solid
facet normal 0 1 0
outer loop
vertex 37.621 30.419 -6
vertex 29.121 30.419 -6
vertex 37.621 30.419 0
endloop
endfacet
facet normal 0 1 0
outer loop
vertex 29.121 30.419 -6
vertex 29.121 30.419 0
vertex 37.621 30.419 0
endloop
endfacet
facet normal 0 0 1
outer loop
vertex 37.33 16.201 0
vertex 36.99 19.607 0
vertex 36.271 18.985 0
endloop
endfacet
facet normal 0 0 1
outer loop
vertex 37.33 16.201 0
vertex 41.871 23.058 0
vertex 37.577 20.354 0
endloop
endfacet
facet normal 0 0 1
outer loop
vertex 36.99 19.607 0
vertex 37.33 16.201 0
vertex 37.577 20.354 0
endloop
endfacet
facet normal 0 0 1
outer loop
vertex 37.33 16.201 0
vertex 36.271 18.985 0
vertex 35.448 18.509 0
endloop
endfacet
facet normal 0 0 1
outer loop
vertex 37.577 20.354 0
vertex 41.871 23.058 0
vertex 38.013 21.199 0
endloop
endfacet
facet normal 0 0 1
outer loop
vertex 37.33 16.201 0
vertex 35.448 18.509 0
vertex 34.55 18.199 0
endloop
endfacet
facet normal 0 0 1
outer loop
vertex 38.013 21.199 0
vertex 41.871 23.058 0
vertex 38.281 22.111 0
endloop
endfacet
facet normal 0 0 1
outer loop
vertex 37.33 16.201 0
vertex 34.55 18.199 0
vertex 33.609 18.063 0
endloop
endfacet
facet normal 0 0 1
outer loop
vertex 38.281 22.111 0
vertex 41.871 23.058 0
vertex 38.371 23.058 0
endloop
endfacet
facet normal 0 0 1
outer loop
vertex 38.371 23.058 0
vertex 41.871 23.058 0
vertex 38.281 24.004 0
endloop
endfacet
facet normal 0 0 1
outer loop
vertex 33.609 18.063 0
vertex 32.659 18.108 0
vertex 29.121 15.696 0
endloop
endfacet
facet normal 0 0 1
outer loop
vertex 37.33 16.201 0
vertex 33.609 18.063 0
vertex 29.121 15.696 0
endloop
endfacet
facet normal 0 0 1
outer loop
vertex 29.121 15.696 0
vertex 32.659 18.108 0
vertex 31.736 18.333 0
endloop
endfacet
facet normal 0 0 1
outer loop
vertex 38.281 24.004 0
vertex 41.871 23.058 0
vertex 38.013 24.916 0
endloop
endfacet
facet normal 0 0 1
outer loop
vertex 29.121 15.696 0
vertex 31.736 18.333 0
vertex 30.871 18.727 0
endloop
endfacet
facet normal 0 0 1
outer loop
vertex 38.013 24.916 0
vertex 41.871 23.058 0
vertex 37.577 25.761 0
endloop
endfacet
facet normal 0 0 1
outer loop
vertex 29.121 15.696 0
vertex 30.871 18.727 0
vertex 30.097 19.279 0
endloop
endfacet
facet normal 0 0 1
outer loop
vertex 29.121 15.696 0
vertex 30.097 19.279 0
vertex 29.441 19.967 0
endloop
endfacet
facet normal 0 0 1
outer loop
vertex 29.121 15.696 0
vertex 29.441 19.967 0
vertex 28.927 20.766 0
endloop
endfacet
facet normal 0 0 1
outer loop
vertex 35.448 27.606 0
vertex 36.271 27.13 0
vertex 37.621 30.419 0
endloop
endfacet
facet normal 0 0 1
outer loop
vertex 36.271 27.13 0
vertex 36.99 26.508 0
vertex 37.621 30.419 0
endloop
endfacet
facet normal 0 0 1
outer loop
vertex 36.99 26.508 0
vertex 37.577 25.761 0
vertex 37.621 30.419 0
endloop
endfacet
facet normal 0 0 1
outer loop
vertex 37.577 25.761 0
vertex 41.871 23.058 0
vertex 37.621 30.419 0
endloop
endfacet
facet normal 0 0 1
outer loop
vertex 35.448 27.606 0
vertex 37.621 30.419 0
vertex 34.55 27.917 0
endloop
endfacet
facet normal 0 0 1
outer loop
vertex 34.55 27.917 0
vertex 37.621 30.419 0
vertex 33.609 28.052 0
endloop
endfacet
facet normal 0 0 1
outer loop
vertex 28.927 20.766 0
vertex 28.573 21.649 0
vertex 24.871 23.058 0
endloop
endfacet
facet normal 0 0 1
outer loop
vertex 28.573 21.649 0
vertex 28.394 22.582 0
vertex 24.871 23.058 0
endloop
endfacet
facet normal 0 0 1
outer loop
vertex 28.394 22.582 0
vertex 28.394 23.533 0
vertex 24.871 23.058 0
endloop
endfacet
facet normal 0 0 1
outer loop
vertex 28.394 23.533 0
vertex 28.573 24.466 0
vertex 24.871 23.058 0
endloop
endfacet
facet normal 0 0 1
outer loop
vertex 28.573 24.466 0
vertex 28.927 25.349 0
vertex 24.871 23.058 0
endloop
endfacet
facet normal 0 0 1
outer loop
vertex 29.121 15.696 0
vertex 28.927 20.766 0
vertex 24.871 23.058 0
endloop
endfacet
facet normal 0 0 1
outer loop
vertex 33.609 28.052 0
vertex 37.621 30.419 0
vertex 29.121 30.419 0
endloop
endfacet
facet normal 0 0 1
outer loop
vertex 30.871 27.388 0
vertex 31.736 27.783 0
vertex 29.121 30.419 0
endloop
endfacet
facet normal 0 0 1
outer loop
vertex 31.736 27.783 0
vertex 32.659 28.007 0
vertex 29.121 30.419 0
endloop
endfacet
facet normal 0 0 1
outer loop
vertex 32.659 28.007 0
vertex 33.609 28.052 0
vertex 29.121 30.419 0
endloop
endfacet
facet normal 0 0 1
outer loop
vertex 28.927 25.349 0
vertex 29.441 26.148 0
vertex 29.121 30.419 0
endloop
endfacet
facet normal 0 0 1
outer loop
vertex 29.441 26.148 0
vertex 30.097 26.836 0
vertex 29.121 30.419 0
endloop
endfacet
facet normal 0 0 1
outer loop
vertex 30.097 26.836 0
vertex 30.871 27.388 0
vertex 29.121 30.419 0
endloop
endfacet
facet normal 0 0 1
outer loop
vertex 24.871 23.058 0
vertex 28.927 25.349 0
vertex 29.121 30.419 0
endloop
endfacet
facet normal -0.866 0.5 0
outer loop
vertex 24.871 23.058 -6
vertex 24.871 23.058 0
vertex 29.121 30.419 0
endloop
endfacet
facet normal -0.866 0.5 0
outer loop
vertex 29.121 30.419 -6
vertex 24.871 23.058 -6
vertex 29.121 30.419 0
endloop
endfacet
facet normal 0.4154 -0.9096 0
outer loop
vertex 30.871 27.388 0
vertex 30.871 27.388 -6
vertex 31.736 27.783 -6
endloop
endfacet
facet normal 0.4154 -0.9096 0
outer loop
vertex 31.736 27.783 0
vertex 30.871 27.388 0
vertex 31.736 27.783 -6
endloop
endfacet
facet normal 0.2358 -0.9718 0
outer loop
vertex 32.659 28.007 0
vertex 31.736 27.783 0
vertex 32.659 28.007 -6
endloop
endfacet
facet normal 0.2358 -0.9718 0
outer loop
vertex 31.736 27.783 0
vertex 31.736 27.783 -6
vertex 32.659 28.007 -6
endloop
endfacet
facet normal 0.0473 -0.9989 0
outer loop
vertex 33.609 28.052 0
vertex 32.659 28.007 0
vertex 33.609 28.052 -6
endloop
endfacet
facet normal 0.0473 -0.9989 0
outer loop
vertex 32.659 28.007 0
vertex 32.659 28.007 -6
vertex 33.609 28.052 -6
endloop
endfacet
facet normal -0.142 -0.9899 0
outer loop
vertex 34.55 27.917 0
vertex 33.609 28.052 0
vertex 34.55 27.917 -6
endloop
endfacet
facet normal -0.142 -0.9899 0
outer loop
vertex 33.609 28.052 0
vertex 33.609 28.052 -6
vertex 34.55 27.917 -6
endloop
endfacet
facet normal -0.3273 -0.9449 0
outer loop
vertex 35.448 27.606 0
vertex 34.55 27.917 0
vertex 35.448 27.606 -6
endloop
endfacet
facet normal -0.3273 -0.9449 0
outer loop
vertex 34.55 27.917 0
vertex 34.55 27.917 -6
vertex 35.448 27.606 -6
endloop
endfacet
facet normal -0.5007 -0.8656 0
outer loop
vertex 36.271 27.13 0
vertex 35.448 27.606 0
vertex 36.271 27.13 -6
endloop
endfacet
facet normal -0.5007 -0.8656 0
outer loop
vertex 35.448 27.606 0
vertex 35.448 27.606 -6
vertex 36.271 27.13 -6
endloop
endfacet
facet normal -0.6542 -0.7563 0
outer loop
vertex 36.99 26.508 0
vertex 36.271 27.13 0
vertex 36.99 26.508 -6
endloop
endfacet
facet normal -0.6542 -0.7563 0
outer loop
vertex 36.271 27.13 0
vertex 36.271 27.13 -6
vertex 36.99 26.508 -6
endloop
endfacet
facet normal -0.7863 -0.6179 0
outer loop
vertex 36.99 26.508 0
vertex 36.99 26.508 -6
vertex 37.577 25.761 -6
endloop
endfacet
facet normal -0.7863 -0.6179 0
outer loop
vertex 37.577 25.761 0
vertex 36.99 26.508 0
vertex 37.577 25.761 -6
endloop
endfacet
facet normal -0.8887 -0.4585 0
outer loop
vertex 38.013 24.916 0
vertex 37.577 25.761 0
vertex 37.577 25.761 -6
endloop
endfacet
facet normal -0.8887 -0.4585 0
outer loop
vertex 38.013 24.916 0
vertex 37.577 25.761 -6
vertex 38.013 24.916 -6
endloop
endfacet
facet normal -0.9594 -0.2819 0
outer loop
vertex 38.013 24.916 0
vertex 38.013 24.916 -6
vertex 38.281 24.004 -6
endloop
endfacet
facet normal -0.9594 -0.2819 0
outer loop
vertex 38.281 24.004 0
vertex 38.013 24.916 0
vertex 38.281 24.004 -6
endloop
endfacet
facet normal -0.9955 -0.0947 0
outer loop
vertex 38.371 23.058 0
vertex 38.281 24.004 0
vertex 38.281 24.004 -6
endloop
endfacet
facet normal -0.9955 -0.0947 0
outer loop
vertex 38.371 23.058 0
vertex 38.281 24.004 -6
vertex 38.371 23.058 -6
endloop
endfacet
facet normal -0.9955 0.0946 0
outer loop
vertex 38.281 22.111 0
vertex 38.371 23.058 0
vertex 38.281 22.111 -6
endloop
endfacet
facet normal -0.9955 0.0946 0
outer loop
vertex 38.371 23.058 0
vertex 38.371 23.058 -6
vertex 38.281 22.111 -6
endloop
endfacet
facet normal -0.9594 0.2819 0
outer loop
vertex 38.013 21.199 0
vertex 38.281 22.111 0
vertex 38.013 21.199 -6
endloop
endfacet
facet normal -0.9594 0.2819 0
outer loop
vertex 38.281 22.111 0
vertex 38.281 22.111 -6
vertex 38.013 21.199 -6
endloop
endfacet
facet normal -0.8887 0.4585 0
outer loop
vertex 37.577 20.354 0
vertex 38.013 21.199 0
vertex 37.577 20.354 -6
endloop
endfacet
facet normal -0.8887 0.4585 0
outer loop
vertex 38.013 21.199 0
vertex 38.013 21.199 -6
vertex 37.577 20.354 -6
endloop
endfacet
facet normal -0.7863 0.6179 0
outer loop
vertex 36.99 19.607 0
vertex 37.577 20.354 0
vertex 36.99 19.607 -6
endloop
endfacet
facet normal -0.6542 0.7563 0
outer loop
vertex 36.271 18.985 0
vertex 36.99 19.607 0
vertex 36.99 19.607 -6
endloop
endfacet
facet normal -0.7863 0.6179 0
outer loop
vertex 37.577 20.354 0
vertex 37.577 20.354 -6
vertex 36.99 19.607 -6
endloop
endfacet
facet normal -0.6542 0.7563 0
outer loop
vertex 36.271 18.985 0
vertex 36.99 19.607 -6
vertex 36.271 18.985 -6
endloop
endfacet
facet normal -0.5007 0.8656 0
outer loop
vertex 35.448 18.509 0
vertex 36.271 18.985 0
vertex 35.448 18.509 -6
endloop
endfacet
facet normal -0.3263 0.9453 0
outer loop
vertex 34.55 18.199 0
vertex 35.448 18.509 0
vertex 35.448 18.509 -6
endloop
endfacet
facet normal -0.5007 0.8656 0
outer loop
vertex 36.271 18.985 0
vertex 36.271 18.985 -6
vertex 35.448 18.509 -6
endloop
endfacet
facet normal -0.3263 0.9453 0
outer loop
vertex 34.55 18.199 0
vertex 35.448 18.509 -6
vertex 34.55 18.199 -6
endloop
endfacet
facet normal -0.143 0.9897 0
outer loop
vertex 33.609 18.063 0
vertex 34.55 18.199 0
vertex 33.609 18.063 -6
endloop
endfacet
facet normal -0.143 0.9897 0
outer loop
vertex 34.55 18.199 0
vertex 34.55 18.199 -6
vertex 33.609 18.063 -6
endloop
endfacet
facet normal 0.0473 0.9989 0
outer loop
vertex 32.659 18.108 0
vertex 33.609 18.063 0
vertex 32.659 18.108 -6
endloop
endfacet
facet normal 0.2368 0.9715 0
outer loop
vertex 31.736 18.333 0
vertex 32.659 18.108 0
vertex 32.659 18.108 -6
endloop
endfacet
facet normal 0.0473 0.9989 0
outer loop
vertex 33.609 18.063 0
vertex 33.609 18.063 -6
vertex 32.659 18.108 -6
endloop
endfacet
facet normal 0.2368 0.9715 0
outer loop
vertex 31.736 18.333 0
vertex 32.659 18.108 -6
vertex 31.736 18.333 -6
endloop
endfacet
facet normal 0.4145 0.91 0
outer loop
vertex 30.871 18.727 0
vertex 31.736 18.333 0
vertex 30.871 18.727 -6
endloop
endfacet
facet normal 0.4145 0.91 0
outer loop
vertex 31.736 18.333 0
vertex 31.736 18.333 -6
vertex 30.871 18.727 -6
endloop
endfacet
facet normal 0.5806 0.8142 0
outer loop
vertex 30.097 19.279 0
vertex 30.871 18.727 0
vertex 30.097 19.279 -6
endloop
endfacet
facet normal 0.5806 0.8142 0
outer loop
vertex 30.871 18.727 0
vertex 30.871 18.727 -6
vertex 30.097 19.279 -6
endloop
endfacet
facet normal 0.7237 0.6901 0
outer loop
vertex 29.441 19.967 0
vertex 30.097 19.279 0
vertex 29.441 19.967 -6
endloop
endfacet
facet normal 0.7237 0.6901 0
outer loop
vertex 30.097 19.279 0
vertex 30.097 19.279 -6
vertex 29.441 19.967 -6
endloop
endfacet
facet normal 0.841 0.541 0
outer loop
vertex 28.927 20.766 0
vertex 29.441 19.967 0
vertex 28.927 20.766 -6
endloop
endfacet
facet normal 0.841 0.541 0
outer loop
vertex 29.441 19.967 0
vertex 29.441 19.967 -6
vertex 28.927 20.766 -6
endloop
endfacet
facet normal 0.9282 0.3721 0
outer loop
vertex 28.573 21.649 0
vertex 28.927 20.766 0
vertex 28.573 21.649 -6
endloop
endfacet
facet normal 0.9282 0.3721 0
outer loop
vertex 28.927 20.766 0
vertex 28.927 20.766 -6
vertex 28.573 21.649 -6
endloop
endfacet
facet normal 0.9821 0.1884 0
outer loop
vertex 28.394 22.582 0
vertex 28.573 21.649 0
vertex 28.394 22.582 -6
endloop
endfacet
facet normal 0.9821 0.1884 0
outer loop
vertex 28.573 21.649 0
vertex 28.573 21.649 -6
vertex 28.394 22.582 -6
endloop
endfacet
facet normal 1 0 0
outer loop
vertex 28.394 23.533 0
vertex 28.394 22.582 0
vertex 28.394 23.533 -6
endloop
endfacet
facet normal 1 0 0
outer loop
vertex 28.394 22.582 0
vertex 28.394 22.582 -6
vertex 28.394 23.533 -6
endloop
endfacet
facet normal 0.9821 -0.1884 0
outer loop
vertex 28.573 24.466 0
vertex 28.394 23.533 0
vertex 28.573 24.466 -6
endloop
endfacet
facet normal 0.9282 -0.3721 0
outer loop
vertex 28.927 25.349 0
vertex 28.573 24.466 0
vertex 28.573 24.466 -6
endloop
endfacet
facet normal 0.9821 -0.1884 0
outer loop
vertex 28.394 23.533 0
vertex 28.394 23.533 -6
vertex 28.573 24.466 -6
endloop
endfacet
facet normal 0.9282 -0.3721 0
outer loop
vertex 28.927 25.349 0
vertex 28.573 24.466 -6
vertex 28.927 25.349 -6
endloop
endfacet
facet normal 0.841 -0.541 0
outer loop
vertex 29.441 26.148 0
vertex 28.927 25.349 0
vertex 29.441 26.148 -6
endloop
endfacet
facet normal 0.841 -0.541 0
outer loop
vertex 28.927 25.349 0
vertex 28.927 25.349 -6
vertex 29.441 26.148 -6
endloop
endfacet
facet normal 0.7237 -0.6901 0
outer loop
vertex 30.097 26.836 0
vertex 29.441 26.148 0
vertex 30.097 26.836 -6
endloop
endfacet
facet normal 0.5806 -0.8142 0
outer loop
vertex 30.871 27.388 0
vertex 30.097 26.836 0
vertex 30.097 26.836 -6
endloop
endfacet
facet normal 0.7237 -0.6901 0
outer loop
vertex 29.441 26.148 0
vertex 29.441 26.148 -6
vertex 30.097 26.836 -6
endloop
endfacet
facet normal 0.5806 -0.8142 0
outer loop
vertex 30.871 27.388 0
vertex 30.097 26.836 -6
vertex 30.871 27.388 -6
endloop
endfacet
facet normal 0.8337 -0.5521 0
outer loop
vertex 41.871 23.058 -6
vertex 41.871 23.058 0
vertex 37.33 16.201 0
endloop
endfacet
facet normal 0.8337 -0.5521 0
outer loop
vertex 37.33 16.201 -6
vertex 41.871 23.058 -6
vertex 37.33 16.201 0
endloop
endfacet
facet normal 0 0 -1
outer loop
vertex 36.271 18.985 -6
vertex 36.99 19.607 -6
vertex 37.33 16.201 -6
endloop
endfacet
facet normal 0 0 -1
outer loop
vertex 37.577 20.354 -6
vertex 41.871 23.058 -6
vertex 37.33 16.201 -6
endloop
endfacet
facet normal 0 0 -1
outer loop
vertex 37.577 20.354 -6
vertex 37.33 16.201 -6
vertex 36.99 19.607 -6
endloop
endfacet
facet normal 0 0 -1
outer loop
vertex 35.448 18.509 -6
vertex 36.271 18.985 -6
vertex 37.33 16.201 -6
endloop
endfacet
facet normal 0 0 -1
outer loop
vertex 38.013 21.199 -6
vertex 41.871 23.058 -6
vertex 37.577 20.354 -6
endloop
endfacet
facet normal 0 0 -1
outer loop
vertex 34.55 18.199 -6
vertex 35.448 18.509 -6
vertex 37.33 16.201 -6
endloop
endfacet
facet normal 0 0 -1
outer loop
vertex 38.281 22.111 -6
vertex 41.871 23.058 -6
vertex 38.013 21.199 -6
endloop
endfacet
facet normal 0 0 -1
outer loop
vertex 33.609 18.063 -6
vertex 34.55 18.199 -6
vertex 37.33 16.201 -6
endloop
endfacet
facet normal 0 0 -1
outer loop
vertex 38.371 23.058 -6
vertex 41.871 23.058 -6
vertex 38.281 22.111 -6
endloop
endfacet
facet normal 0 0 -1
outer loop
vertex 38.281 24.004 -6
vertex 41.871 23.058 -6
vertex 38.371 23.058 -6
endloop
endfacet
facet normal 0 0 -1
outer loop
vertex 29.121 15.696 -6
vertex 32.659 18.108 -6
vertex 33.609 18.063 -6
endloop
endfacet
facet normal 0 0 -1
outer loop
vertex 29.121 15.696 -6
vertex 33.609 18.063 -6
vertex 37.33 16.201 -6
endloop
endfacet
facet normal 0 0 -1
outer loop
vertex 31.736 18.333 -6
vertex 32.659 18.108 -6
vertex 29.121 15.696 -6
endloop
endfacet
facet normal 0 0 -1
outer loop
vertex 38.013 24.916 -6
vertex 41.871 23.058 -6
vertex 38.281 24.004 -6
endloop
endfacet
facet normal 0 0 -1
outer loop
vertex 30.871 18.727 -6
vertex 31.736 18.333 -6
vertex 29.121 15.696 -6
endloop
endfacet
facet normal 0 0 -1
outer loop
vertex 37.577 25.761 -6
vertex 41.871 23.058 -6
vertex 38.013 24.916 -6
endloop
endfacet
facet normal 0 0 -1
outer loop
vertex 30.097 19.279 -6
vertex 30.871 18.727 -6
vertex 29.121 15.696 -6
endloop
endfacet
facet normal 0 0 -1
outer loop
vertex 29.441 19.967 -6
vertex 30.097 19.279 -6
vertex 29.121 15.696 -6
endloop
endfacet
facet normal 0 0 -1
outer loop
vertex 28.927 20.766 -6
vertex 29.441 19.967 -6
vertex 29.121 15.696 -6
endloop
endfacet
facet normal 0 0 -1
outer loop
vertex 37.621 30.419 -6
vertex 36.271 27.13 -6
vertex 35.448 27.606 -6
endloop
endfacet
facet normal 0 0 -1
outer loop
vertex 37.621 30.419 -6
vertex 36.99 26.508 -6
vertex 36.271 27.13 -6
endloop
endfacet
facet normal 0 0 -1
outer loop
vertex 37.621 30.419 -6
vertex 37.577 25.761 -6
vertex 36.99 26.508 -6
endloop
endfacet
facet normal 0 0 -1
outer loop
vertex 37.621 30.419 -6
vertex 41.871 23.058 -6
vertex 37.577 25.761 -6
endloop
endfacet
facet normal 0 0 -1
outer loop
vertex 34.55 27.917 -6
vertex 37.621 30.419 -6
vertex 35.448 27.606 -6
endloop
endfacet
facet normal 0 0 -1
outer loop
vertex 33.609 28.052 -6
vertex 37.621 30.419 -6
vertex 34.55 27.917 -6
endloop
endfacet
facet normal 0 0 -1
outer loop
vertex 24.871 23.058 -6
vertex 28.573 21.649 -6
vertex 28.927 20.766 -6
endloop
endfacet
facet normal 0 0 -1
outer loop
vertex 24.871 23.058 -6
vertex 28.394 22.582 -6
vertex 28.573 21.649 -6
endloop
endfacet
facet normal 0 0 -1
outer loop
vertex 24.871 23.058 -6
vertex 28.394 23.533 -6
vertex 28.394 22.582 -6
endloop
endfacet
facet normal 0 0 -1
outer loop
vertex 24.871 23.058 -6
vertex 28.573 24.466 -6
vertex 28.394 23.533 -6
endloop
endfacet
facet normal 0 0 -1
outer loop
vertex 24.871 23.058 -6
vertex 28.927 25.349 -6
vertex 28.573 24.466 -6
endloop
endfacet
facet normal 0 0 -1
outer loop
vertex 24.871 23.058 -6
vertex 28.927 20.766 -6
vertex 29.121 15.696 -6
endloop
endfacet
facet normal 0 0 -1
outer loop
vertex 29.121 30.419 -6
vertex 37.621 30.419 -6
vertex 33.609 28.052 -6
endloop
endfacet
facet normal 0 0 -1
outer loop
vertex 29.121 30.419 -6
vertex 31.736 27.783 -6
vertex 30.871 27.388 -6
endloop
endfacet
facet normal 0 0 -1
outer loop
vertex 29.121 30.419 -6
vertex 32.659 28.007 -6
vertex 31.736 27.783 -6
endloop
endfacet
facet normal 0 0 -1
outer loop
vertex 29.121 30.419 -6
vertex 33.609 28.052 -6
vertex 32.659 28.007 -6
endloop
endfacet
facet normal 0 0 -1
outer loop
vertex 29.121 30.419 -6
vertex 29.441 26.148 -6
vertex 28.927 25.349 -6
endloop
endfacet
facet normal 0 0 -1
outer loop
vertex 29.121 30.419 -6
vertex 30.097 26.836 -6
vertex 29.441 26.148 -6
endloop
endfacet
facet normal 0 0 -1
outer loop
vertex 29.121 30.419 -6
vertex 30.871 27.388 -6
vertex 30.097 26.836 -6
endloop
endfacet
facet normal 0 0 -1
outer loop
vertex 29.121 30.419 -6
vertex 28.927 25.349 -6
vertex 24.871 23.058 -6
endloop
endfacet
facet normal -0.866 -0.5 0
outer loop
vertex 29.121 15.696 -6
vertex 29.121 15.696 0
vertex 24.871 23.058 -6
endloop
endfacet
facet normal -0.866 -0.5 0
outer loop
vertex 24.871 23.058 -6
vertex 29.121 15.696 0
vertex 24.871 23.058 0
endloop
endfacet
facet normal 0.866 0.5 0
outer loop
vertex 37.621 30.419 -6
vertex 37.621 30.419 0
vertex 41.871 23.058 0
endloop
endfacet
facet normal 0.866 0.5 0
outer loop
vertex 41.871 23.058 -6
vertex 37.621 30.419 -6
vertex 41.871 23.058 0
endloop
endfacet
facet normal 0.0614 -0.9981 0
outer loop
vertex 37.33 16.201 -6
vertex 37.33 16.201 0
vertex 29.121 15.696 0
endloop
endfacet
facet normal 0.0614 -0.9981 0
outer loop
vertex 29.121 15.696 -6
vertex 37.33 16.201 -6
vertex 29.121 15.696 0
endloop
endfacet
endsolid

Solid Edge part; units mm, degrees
sketch "Sketch1" plane through (0, 0, 0) normal (0, 0, 1) x (1, 0, 0)
  line L0 (24.8709, 23.0576) -> (29.1209, 30.4188)
  line L1 (29.1209, 30.4188) -> (37.6209, 30.4188)
  line L2 (37.6209, 30.4188) -> (41.8709, 23.0576)
  line L3 (41.8709, 23.0576) -> (37.3297, 16.2008)
  line L4 (37.3297, 16.2008) -> (29.1209, 15.6964)
  line L5 (29.1209, 15.6964) -> (24.8709, 23.0576)
extrude "Protrusion1" add sketch "Sketch1" against normal blind 6
sketch "Sketch2" plane through (33.3709, 23.0576, -6) normal (0, 0, -1) x (-0.5, 0.866, 0)
  circle A0 centre (0, 0) radius 5
extrude "ExtrudedCutout_2" cut sketch "Sketch2" against normal blind 6
